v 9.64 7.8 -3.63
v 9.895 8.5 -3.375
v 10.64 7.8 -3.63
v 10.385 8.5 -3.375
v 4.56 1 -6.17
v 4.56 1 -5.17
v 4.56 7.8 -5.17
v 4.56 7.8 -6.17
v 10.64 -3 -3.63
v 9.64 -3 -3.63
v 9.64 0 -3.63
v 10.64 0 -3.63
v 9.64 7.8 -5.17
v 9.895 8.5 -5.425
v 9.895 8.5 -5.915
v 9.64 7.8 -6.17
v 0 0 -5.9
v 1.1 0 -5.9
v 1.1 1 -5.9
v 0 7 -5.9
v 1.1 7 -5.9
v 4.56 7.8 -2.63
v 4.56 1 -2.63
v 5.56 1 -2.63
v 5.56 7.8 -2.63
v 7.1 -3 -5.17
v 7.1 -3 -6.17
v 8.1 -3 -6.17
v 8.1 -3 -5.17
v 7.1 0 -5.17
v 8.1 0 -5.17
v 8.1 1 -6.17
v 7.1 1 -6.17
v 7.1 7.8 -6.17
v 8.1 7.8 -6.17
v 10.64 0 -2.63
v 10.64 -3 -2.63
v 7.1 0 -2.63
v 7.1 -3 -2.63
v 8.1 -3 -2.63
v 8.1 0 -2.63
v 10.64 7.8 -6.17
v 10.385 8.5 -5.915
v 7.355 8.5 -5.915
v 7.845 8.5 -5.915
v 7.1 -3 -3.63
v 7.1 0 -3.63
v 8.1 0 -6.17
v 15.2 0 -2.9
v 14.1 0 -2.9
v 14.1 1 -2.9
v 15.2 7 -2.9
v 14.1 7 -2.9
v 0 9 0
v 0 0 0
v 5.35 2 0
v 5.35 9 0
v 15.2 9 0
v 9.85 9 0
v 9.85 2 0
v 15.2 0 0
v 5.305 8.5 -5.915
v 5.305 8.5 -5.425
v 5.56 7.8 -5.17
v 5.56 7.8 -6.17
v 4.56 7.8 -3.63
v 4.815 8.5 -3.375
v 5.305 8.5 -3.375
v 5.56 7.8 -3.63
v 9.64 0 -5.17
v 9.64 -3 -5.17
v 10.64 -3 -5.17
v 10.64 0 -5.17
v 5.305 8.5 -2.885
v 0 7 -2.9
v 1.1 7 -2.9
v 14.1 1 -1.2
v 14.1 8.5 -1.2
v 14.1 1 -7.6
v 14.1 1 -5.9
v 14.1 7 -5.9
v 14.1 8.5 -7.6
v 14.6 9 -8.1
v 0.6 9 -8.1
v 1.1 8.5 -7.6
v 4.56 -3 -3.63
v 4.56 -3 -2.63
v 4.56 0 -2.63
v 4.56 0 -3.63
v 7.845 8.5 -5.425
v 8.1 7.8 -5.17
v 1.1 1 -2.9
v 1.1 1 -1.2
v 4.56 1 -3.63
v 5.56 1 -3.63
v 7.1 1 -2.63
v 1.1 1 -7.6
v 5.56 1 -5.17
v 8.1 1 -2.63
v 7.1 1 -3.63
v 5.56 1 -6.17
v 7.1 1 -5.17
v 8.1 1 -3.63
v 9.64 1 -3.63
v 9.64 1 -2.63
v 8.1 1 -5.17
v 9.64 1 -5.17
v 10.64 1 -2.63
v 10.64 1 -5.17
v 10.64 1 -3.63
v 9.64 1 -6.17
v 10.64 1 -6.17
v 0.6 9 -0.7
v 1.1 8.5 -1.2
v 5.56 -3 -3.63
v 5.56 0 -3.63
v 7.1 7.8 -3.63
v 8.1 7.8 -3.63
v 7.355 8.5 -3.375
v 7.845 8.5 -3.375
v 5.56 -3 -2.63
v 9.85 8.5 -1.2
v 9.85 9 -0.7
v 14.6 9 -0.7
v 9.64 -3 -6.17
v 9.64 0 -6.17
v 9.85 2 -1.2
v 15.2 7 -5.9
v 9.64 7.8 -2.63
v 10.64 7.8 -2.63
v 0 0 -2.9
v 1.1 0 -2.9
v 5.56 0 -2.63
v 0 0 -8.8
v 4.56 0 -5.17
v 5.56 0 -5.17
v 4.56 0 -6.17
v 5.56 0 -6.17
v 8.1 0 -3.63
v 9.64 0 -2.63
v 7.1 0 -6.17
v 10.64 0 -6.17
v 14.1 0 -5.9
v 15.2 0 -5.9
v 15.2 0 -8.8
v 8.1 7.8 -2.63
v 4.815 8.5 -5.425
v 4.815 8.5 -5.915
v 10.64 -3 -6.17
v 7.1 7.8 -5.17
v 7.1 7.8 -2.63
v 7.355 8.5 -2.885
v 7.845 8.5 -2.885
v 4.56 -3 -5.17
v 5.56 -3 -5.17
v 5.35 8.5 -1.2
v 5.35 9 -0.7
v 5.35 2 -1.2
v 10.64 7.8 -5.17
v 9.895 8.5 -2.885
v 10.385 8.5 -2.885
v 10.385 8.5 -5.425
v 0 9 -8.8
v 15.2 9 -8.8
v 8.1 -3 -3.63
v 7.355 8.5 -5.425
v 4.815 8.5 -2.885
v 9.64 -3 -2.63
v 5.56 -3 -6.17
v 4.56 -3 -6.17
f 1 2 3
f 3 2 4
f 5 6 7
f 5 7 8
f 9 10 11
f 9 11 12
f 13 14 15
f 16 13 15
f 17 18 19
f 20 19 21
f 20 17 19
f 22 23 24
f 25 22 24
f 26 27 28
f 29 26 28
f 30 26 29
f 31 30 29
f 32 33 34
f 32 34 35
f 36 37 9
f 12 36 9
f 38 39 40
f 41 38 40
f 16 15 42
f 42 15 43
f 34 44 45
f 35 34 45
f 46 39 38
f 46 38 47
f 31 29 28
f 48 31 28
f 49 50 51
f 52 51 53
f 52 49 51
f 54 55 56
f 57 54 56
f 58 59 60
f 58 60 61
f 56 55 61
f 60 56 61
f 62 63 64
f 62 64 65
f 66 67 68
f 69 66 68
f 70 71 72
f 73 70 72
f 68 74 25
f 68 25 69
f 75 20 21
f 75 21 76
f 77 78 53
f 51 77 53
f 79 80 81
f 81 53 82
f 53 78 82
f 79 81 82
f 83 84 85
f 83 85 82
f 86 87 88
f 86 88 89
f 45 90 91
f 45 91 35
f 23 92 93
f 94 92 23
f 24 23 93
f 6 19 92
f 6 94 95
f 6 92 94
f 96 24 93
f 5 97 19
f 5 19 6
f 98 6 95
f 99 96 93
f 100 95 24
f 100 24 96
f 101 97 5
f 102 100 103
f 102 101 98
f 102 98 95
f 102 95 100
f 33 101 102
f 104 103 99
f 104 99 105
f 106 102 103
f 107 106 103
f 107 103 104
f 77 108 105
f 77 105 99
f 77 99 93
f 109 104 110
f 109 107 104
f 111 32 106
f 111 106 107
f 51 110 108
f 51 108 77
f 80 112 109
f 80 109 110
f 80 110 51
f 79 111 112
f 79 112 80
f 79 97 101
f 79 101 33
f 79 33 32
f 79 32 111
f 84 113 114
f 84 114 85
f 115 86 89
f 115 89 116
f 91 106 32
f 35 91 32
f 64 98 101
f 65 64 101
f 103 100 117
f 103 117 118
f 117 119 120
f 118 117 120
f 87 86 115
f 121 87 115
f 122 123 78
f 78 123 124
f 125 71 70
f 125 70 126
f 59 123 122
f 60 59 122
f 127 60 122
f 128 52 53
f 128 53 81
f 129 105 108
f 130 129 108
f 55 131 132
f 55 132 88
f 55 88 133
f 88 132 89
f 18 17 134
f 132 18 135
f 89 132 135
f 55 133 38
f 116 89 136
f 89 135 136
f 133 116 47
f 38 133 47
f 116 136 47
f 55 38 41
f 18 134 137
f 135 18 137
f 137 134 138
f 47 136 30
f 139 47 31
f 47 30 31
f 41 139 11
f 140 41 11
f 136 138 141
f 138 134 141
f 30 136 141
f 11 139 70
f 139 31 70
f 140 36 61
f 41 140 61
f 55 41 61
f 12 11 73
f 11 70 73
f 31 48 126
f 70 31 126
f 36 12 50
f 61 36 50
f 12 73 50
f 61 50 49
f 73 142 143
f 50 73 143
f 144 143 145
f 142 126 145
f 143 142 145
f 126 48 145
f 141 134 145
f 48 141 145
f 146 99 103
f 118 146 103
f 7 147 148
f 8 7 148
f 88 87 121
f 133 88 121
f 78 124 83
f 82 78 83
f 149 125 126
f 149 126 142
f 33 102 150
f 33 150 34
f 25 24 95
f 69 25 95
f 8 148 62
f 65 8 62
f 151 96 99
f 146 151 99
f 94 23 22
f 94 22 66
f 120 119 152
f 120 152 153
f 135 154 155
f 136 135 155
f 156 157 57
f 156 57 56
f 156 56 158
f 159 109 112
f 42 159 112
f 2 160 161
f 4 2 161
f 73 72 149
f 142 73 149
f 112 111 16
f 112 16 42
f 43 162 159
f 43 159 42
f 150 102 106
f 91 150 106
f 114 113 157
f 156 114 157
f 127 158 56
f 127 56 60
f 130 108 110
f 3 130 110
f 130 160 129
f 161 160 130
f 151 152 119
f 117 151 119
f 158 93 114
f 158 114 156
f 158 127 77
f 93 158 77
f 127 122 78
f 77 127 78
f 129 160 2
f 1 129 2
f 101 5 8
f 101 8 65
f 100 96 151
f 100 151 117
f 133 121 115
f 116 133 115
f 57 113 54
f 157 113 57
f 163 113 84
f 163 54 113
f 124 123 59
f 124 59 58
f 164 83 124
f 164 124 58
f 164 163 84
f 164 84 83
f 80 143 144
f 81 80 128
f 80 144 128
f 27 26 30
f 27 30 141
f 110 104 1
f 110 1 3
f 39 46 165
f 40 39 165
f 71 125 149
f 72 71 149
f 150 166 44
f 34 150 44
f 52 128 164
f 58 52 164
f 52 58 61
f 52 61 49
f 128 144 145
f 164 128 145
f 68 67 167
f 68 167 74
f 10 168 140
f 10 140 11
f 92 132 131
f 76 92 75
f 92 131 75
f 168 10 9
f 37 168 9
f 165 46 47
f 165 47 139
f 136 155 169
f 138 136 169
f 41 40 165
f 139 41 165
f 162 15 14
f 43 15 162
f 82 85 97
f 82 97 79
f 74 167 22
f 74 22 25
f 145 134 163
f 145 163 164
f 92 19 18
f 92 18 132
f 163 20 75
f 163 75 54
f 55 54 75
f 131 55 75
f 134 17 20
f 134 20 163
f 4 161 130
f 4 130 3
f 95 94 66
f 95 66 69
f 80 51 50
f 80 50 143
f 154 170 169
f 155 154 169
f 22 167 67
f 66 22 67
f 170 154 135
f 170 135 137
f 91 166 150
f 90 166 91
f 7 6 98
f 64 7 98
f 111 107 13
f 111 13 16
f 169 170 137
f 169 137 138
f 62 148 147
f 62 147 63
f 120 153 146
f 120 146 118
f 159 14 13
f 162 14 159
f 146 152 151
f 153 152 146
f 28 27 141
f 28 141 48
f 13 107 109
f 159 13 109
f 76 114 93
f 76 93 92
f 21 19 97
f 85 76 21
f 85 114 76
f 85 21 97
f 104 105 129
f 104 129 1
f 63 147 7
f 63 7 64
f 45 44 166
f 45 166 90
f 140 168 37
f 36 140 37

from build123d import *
from OCP.BRepFilletAPI import BRepFilletAPI_MakeChamfer

# Parameters (mm, degrees)
SKETCH1_W                = 15.2
SKETCH1_H                = 8.8
BOSS_EXTRUDE1_DEPTH      = 9
SKETCH3_W                = 13
SKETCH3_H                = 6.4
CUT_EXTRUDE1_DEPTH       = 8
SKETCH4_W                = 4.5
SKETCH4_H                = 1.2
CUT_EXTRUDE2_DEPTH       = 7
SKETCH5_W                = 3
SKETCH5_H                = 7
CUT_EXTRUDE3_DEPTH       = 1.1
SKETCH6_W                = 3
SKETCH6_H                = 7
CUT_EXTRUDE4_DEPTH       = 1.1
BOSS_EXTRUDE2_DEPTH      = 7.5
BOSS_EXTRUDE2_DEPTH_BACK = 4
SKETCH7_W                = 1
SKETCH7_H                = 1
CHAMFER1_SIZE            = 0.7
CHAMFER1_SIZE2           = 0.254779164
CHAMFER2_SIZE            = 0.5


with BuildPart() as part:
    # Sketch1 → Boss-Extrude1 (new body)
    with BuildSketch(Plane(origin=(0, 0, 0), x_dir=(1, 0, 0), z_dir=(0, 1, 0))):
        with Locations((7.6, 4.4)):
            Rectangle(SKETCH1_W, SKETCH1_H)
    extrude(amount=BOSS_EXTRUDE1_DEPTH)

    # Sketch3 → Cut-Extrude1 (cut)
    with BuildSketch(Plane(origin=(0, 9, 0), x_dir=(1, 0, 0), z_dir=(0, 1, 0))):
        with Locations((7.6, 4.4)):
            Rectangle(SKETCH3_W, SKETCH3_H)
    extrude(amount=-CUT_EXTRUDE1_DEPTH, mode=Mode.SUBTRACT)

    # Sketch4 → Cut-Extrude2 (cut)
    with BuildSketch(Plane(origin=(0, 9, 0), x_dir=(1, 0, 0), z_dir=(0, 1, 0))):
        with Locations((7.6, 0.6)):
            Rectangle(SKETCH4_W, SKETCH4_H)
    extrude(amount=-CUT_EXTRUDE2_DEPTH, mode=Mode.SUBTRACT)

    # Sketch5 → Cut-Extrude3 (cut)
    with BuildSketch(Plane.ZY):
        with Locations((-4.4, 3.5)):
            Rectangle(SKETCH5_W, SKETCH5_H)
    extrude(amount=-CUT_EXTRUDE3_DEPTH, mode=Mode.SUBTRACT)

    # Sketch6 → Cut-Extrude4 (cut)
    with BuildSketch(Plane(origin=(15.2, 0, 0), x_dir=(0, 0, -1), z_dir=(1, 0, 0))):
        with Locations((4.4, 3.5)):
            Rectangle(SKETCH6_W, SKETCH6_H)
    extrude(amount=-CUT_EXTRUDE4_DEPTH, mode=Mode.SUBTRACT)

    # Sketch7 → Boss-Extrude2 (add, two sides: drawn at the far end of the back side and taken through both)
    with BuildSketch(Plane(origin=(0, 1, 0), x_dir=(1, 0, 0), z_dir=(0, 1, 0)).offset(-BOSS_EXTRUDE2_DEPTH_BACK)):
        with Locations((7.6, 5.67)):
            Rectangle(SKETCH7_W, SKETCH7_H)
        with Locations((5.06, 5.67)):
            Rectangle(SKETCH7_W, SKETCH7_H)
        with Locations((10.14, 5.67)):
            Rectangle(SKETCH7_W, SKETCH7_H)
        with Locations((7.6, 3.13)):
            Rectangle(SKETCH7_W, SKETCH7_H)
        with Locations((10.14, 3.13)):
            Rectangle(SKETCH7_W, SKETCH7_H)
        with Locations((5.06, 3.13)):
            Rectangle(SKETCH7_W, SKETCH7_H)
    extrude(amount=BOSS_EXTRUDE2_DEPTH + BOSS_EXTRUDE2_DEPTH_BACK)

    # Chamfer1: one chamfer whose edges measure the first distance from different faces: ONE call of the kernel's chamfer builder (chamfer() names one face for all edges)
    chamfer1_edges_1 = [part.edges().sort_by_distance(p)[0] for p in [
        (7.1, 8.5, -5.67),
    ]]
    chamfer1_side_1 = [part.faces().sort_by_distance(p)[0] for p in [
        (7.1, 4.75, -5.67),
    ]]
    chamfer1_edges_2 = [part.edges().sort_by_distance(p)[0] for p in [
        (7.6, 8.5, -5.17),
    ]]
    chamfer1_side_2 = [part.faces().sort_by_distance(p)[0] for p in [
        (7.6, 4.75, -5.17),
    ]]
    chamfer1_edges_3 = [part.edges().sort_by_distance(p)[0] for p in [
        (8.1, 8.5, -5.67),
    ]]
    chamfer1_side_3 = [part.faces().sort_by_distance(p)[0] for p in [
        (8.1, 4.75, -5.67),
    ]]
    chamfer1_edges_4 = [part.edges().sort_by_distance(p)[0] for p in [
        (7.6, 8.5, -6.17),
    ]]
    chamfer1_side_4 = [part.faces().sort_by_distance(p)[0] for p in [
        (7.6, 4.75, -6.17),
    ]]
    chamfer1_edges_5 = [part.edges().sort_by_distance(p)[0] for p in [
        (9.64, 8.5, -5.67),
    ]]
    chamfer1_side_5 = [part.faces().sort_by_distance(p)[0] for p in [
        (9.64, 4.75, -5.67),
    ]]
    chamfer1_edges_6 = [part.edges().sort_by_distance(p)[0] for p in [
        (10.14, 8.5, -5.17),
    ]]
    chamfer1_side_6 = [part.faces().sort_by_distance(p)[0] for p in [
        (10.14, 4.75, -5.17),
    ]]
    chamfer1_edges_7 = [part.edges().sort_by_distance(p)[0] for p in [
        (10.64, 8.5, -5.67),
    ]]
    chamfer1_side_7 = [part.faces().sort_by_distance(p)[0] for p in [
        (10.64, 4.75, -5.67),
    ]]
    chamfer1_edges_8 = [part.edges().sort_by_distance(p)[0] for p in [
        (10.14, 8.5, -6.17),
    ]]
    chamfer1_side_8 = [part.faces().sort_by_distance(p)[0] for p in [
        (10.14, 4.75, -6.17),
    ]]
    chamfer1_edges_9 = [part.edges().sort_by_distance(p)[0] for p in [
        (7.1, 8.5, -3.13),
    ]]
    chamfer1_side_9 = [part.faces().sort_by_distance(p)[0] for p in [
        (7.1, 4.75, -3.13),
    ]]
    chamfer1_edges_10 = [part.edges().sort_by_distance(p)[0] for p in [
        (7.6, 8.5, -2.63),
    ]]
    chamfer1_side_10 = [part.faces().sort_by_distance(p)[0] for p in [
        (7.6, 4.75, -2.63),
    ]]
    chamfer1_edges_11 = [part.edges().sort_by_distance(p)[0] for p in [
        (8.1, 8.5, -3.13),
    ]]
    chamfer1_side_11 = [part.faces().sort_by_distance(p)[0] for p in [
        (8.1, 4.75, -3.13),
    ]]
    chamfer1_edges_12 = [part.edges().sort_by_distance(p)[0] for p in [
        (7.6, 8.5, -3.63),
    ]]
    chamfer1_side_12 = [part.faces().sort_by_distance(p)[0] for p in [
        (7.6, 4.75, -3.63),
    ]]
    chamfer1_edges_13 = [part.edges().sort_by_distance(p)[0] for p in [
        (9.64, 8.5, -3.13),
    ]]
    chamfer1_side_13 = [part.faces().sort_by_distance(p)[0] for p in [
        (9.64, 4.75, -3.13),
    ]]
    chamfer1_edges_14 = [part.edges().sort_by_distance(p)[0] for p in [
        (10.14, 8.5, -2.63),
    ]]
    chamfer1_side_14 = [part.faces().sort_by_distance(p)[0] for p in [
        (10.14, 4.75, -2.63),
    ]]
    chamfer1_edges_15 = [part.edges().sort_by_distance(p)[0] for p in [
        (10.64, 8.5, -3.13),
    ]]
    chamfer1_side_15 = [part.faces().sort_by_distance(p)[0] for p in [
        (10.64, 4.75, -3.13),
    ]]
    chamfer1_edges_16 = [part.edges().sort_by_distance(p)[0] for p in [
        (10.14, 8.5, -3.63),
    ]]
    chamfer1_side_16 = [part.faces().sort_by_distance(p)[0] for p in [
        (10.14, 4.75, -3.63),
    ]]
    chamfer1_edges_17 = [part.edges().sort_by_distance(p)[0] for p in [
        (4.56, 8.5, -3.13),
    ]]
    chamfer1_side_17 = [part.faces().sort_by_distance(p)[0] for p in [
        (4.56, 4.75, -3.13),
    ]]
    chamfer1_edges_18 = [part.edges().sort_by_distance(p)[0] for p in [
        (5.06, 8.5, -2.63),
    ]]
    chamfer1_side_18 = [part.faces().sort_by_distance(p)[0] for p in [
        (5.06, 4.75, -2.63),
    ]]
    chamfer1_edges_19 = [part.edges().sort_by_distance(p)[0] for p in [
        (5.56, 8.5, -3.13),
    ]]
    chamfer1_side_19 = [part.faces().sort_by_distance(p)[0] for p in [
        (5.56, 4.75, -3.13),
    ]]
    chamfer1_edges_20 = [part.edges().sort_by_distance(p)[0] for p in [
        (5.06, 8.5, -3.63),
    ]]
    chamfer1_side_20 = [part.faces().sort_by_distance(p)[0] for p in [
        (5.06, 4.75, -3.63),
    ]]
    chamfer1_edges_21 = [part.edges().sort_by_distance(p)[0] for p in [
        (4.56, 8.5, -5.67),
    ]]
    chamfer1_side_21 = [part.faces().sort_by_distance(p)[0] for p in [
        (4.56, 4.75, -5.67),
    ]]
    chamfer1_edges_22 = [part.edges().sort_by_distance(p)[0] for p in [
        (5.06, 8.5, -5.17),
    ]]
    chamfer1_side_22 = [part.faces().sort_by_distance(p)[0] for p in [
        (5.06, 4.75, -5.17),
    ]]
    chamfer1_edges_23 = [part.edges().sort_by_distance(p)[0] for p in [
        (5.56, 8.5, -5.67),
    ]]
    chamfer1_side_23 = [part.faces().sort_by_distance(p)[0] for p in [
        (5.56, 4.75, -5.67),
    ]]
    chamfer1_edges_24 = [part.edges().sort_by_distance(p)[0] for p in [
        (5.06, 8.5, -6.17),
    ]]
    chamfer1_side_24 = [part.faces().sort_by_distance(p)[0] for p in [
        (5.06, 4.75, -6.17),
    ]]
    chamfer1 = BRepFilletAPI_MakeChamfer(part.part.solid().wrapped)
    for e in chamfer1_edges_1:
        chamfer1.Add(CHAMFER1_SIZE, CHAMFER1_SIZE2, e.wrapped, chamfer1_side_1[0].wrapped)  # the first distance lies on this face
    for e in chamfer1_edges_2:
        chamfer1.Add(CHAMFER1_SIZE, CHAMFER1_SIZE2, e.wrapped, chamfer1_side_2[0].wrapped)  # the first distance lies on this face
    for e in chamfer1_edges_3:
        chamfer1.Add(CHAMFER1_SIZE, CHAMFER1_SIZE2, e.wrapped, chamfer1_side_3[0].wrapped)  # the first distance lies on this face
    for e in chamfer1_edges_4:
        chamfer1.Add(CHAMFER1_SIZE, CHAMFER1_SIZE2, e.wrapped, chamfer1_side_4[0].wrapped)  # the first distance lies on this face
    for e in chamfer1_edges_5:
        chamfer1.Add(CHAMFER1_SIZE, CHAMFER1_SIZE2, e.wrapped, chamfer1_side_5[0].wrapped)  # the first distance lies on this face
    for e in chamfer1_edges_6:
        chamfer1.Add(CHAMFER1_SIZE, CHAMFER1_SIZE2, e.wrapped, chamfer1_side_6[0].wrapped)  # the first distance lies on this face
    for e in chamfer1_edges_7:
        chamfer1.Add(CHAMFER1_SIZE, CHAMFER1_SIZE2, e.wrapped, chamfer1_side_7[0].wrapped)  # the first distance lies on this face
    for e in chamfer1_edges_8:
        chamfer1.Add(CHAMFER1_SIZE, CHAMFER1_SIZE2, e.wrapped, chamfer1_side_8[0].wrapped)  # the first distance lies on this face
    for e in chamfer1_edges_9:
        chamfer1.Add(CHAMFER1_SIZE, CHAMFER1_SIZE2, e.wrapped, chamfer1_side_9[0].wrapped)  # the first distance lies on this face
    for e in chamfer1_edges_10:
        chamfer1.Add(CHAMFER1_SIZE, CHAMFER1_SIZE2, e.wrapped, chamfer1_side_10[0].wrapped)  # the first distance lies on this face
    for e in chamfer1_edges_11:
        chamfer1.Add(CHAMFER1_SIZE, CHAMFER1_SIZE2, e.wrapped, chamfer1_side_11[0].wrapped)  # the first distance lies on this face
    for e in chamfer1_edges_12:
        chamfer1.Add(CHAMFER1_SIZE, CHAMFER1_SIZE2, e.wrapped, chamfer1_side_12[0].wrapped)  # the first distance lies on this face
    for e in chamfer1_edges_13:
        chamfer1.Add(CHAMFER1_SIZE, CHAMFER1_SIZE2, e.wrapped, chamfer1_side_13[0].wrapped)  # the first distance lies on this face
    for e in chamfer1_edges_14:
        chamfer1.Add(CHAMFER1_SIZE, CHAMFER1_SIZE2, e.wrapped, chamfer1_side_14[0].wrapped)  # the first distance lies on this face
    for e in chamfer1_edges_15:
        chamfer1.Add(CHAMFER1_SIZE, CHAMFER1_SIZE2, e.wrapped, chamfer1_side_15[0].wrapped)  # the first distance lies on this face
    for e in chamfer1_edges_16:
        chamfer1.Add(CHAMFER1_SIZE, CHAMFER1_SIZE2, e.wrapped, chamfer1_side_16[0].wrapped)  # the first distance lies on this face
    for e in chamfer1_edges_17:
        chamfer1.Add(CHAMFER1_SIZE, CHAMFER1_SIZE2, e.wrapped, chamfer1_side_17[0].wrapped)  # the first distance lies on this face
    for e in chamfer1_edges_18:
        chamfer1.Add(CHAMFER1_SIZE, CHAMFER1_SIZE2, e.wrapped, chamfer1_side_18[0].wrapped)  # the first distance lies on this face
    for e in chamfer1_edges_19:
        chamfer1.Add(CHAMFER1_SIZE, CHAMFER1_SIZE2, e.wrapped, chamfer1_side_19[0].wrapped)  # the first distance lies on this face
    for e in chamfer1_edges_20:
        chamfer1.Add(CHAMFER1_SIZE, CHAMFER1_SIZE2, e.wrapped, chamfer1_side_20[0].wrapped)  # the first distance lies on this face
    for e in chamfer1_edges_21:
        chamfer1.Add(CHAMFER1_SIZE, CHAMFER1_SIZE2, e.wrapped, chamfer1_side_21[0].wrapped)  # the first distance lies on this face
    for e in chamfer1_edges_22:
        chamfer1.Add(CHAMFER1_SIZE, CHAMFER1_SIZE2, e.wrapped, chamfer1_side_22[0].wrapped)  # the first distance lies on this face
    for e in chamfer1_edges_23:
        chamfer1.Add(CHAMFER1_SIZE, CHAMFER1_SIZE2, e.wrapped, chamfer1_side_23[0].wrapped)  # the first distance lies on this face
    for e in chamfer1_edges_24:
        chamfer1.Add(CHAMFER1_SIZE, CHAMFER1_SIZE2, e.wrapped, chamfer1_side_24[0].wrapped)  # the first distance lies on this face
    add(Compound.cast(chamfer1.Shape()), mode=Mode.REPLACE)

    # Chamfer2
    chamfer2_edges = [part.edges().sort_by_distance(p)[0] for p in [
        (1.1, 9, -4.4),
        (3.225, 9, -1.2),
        (14.1, 9, -4.4),
        (7.6, 9, -7.6),
        (11.975, 9, -1.2),
    ]]
    chamfer(chamfer2_edges, length=CHAMFER2_SIZE)


solid = part.part
